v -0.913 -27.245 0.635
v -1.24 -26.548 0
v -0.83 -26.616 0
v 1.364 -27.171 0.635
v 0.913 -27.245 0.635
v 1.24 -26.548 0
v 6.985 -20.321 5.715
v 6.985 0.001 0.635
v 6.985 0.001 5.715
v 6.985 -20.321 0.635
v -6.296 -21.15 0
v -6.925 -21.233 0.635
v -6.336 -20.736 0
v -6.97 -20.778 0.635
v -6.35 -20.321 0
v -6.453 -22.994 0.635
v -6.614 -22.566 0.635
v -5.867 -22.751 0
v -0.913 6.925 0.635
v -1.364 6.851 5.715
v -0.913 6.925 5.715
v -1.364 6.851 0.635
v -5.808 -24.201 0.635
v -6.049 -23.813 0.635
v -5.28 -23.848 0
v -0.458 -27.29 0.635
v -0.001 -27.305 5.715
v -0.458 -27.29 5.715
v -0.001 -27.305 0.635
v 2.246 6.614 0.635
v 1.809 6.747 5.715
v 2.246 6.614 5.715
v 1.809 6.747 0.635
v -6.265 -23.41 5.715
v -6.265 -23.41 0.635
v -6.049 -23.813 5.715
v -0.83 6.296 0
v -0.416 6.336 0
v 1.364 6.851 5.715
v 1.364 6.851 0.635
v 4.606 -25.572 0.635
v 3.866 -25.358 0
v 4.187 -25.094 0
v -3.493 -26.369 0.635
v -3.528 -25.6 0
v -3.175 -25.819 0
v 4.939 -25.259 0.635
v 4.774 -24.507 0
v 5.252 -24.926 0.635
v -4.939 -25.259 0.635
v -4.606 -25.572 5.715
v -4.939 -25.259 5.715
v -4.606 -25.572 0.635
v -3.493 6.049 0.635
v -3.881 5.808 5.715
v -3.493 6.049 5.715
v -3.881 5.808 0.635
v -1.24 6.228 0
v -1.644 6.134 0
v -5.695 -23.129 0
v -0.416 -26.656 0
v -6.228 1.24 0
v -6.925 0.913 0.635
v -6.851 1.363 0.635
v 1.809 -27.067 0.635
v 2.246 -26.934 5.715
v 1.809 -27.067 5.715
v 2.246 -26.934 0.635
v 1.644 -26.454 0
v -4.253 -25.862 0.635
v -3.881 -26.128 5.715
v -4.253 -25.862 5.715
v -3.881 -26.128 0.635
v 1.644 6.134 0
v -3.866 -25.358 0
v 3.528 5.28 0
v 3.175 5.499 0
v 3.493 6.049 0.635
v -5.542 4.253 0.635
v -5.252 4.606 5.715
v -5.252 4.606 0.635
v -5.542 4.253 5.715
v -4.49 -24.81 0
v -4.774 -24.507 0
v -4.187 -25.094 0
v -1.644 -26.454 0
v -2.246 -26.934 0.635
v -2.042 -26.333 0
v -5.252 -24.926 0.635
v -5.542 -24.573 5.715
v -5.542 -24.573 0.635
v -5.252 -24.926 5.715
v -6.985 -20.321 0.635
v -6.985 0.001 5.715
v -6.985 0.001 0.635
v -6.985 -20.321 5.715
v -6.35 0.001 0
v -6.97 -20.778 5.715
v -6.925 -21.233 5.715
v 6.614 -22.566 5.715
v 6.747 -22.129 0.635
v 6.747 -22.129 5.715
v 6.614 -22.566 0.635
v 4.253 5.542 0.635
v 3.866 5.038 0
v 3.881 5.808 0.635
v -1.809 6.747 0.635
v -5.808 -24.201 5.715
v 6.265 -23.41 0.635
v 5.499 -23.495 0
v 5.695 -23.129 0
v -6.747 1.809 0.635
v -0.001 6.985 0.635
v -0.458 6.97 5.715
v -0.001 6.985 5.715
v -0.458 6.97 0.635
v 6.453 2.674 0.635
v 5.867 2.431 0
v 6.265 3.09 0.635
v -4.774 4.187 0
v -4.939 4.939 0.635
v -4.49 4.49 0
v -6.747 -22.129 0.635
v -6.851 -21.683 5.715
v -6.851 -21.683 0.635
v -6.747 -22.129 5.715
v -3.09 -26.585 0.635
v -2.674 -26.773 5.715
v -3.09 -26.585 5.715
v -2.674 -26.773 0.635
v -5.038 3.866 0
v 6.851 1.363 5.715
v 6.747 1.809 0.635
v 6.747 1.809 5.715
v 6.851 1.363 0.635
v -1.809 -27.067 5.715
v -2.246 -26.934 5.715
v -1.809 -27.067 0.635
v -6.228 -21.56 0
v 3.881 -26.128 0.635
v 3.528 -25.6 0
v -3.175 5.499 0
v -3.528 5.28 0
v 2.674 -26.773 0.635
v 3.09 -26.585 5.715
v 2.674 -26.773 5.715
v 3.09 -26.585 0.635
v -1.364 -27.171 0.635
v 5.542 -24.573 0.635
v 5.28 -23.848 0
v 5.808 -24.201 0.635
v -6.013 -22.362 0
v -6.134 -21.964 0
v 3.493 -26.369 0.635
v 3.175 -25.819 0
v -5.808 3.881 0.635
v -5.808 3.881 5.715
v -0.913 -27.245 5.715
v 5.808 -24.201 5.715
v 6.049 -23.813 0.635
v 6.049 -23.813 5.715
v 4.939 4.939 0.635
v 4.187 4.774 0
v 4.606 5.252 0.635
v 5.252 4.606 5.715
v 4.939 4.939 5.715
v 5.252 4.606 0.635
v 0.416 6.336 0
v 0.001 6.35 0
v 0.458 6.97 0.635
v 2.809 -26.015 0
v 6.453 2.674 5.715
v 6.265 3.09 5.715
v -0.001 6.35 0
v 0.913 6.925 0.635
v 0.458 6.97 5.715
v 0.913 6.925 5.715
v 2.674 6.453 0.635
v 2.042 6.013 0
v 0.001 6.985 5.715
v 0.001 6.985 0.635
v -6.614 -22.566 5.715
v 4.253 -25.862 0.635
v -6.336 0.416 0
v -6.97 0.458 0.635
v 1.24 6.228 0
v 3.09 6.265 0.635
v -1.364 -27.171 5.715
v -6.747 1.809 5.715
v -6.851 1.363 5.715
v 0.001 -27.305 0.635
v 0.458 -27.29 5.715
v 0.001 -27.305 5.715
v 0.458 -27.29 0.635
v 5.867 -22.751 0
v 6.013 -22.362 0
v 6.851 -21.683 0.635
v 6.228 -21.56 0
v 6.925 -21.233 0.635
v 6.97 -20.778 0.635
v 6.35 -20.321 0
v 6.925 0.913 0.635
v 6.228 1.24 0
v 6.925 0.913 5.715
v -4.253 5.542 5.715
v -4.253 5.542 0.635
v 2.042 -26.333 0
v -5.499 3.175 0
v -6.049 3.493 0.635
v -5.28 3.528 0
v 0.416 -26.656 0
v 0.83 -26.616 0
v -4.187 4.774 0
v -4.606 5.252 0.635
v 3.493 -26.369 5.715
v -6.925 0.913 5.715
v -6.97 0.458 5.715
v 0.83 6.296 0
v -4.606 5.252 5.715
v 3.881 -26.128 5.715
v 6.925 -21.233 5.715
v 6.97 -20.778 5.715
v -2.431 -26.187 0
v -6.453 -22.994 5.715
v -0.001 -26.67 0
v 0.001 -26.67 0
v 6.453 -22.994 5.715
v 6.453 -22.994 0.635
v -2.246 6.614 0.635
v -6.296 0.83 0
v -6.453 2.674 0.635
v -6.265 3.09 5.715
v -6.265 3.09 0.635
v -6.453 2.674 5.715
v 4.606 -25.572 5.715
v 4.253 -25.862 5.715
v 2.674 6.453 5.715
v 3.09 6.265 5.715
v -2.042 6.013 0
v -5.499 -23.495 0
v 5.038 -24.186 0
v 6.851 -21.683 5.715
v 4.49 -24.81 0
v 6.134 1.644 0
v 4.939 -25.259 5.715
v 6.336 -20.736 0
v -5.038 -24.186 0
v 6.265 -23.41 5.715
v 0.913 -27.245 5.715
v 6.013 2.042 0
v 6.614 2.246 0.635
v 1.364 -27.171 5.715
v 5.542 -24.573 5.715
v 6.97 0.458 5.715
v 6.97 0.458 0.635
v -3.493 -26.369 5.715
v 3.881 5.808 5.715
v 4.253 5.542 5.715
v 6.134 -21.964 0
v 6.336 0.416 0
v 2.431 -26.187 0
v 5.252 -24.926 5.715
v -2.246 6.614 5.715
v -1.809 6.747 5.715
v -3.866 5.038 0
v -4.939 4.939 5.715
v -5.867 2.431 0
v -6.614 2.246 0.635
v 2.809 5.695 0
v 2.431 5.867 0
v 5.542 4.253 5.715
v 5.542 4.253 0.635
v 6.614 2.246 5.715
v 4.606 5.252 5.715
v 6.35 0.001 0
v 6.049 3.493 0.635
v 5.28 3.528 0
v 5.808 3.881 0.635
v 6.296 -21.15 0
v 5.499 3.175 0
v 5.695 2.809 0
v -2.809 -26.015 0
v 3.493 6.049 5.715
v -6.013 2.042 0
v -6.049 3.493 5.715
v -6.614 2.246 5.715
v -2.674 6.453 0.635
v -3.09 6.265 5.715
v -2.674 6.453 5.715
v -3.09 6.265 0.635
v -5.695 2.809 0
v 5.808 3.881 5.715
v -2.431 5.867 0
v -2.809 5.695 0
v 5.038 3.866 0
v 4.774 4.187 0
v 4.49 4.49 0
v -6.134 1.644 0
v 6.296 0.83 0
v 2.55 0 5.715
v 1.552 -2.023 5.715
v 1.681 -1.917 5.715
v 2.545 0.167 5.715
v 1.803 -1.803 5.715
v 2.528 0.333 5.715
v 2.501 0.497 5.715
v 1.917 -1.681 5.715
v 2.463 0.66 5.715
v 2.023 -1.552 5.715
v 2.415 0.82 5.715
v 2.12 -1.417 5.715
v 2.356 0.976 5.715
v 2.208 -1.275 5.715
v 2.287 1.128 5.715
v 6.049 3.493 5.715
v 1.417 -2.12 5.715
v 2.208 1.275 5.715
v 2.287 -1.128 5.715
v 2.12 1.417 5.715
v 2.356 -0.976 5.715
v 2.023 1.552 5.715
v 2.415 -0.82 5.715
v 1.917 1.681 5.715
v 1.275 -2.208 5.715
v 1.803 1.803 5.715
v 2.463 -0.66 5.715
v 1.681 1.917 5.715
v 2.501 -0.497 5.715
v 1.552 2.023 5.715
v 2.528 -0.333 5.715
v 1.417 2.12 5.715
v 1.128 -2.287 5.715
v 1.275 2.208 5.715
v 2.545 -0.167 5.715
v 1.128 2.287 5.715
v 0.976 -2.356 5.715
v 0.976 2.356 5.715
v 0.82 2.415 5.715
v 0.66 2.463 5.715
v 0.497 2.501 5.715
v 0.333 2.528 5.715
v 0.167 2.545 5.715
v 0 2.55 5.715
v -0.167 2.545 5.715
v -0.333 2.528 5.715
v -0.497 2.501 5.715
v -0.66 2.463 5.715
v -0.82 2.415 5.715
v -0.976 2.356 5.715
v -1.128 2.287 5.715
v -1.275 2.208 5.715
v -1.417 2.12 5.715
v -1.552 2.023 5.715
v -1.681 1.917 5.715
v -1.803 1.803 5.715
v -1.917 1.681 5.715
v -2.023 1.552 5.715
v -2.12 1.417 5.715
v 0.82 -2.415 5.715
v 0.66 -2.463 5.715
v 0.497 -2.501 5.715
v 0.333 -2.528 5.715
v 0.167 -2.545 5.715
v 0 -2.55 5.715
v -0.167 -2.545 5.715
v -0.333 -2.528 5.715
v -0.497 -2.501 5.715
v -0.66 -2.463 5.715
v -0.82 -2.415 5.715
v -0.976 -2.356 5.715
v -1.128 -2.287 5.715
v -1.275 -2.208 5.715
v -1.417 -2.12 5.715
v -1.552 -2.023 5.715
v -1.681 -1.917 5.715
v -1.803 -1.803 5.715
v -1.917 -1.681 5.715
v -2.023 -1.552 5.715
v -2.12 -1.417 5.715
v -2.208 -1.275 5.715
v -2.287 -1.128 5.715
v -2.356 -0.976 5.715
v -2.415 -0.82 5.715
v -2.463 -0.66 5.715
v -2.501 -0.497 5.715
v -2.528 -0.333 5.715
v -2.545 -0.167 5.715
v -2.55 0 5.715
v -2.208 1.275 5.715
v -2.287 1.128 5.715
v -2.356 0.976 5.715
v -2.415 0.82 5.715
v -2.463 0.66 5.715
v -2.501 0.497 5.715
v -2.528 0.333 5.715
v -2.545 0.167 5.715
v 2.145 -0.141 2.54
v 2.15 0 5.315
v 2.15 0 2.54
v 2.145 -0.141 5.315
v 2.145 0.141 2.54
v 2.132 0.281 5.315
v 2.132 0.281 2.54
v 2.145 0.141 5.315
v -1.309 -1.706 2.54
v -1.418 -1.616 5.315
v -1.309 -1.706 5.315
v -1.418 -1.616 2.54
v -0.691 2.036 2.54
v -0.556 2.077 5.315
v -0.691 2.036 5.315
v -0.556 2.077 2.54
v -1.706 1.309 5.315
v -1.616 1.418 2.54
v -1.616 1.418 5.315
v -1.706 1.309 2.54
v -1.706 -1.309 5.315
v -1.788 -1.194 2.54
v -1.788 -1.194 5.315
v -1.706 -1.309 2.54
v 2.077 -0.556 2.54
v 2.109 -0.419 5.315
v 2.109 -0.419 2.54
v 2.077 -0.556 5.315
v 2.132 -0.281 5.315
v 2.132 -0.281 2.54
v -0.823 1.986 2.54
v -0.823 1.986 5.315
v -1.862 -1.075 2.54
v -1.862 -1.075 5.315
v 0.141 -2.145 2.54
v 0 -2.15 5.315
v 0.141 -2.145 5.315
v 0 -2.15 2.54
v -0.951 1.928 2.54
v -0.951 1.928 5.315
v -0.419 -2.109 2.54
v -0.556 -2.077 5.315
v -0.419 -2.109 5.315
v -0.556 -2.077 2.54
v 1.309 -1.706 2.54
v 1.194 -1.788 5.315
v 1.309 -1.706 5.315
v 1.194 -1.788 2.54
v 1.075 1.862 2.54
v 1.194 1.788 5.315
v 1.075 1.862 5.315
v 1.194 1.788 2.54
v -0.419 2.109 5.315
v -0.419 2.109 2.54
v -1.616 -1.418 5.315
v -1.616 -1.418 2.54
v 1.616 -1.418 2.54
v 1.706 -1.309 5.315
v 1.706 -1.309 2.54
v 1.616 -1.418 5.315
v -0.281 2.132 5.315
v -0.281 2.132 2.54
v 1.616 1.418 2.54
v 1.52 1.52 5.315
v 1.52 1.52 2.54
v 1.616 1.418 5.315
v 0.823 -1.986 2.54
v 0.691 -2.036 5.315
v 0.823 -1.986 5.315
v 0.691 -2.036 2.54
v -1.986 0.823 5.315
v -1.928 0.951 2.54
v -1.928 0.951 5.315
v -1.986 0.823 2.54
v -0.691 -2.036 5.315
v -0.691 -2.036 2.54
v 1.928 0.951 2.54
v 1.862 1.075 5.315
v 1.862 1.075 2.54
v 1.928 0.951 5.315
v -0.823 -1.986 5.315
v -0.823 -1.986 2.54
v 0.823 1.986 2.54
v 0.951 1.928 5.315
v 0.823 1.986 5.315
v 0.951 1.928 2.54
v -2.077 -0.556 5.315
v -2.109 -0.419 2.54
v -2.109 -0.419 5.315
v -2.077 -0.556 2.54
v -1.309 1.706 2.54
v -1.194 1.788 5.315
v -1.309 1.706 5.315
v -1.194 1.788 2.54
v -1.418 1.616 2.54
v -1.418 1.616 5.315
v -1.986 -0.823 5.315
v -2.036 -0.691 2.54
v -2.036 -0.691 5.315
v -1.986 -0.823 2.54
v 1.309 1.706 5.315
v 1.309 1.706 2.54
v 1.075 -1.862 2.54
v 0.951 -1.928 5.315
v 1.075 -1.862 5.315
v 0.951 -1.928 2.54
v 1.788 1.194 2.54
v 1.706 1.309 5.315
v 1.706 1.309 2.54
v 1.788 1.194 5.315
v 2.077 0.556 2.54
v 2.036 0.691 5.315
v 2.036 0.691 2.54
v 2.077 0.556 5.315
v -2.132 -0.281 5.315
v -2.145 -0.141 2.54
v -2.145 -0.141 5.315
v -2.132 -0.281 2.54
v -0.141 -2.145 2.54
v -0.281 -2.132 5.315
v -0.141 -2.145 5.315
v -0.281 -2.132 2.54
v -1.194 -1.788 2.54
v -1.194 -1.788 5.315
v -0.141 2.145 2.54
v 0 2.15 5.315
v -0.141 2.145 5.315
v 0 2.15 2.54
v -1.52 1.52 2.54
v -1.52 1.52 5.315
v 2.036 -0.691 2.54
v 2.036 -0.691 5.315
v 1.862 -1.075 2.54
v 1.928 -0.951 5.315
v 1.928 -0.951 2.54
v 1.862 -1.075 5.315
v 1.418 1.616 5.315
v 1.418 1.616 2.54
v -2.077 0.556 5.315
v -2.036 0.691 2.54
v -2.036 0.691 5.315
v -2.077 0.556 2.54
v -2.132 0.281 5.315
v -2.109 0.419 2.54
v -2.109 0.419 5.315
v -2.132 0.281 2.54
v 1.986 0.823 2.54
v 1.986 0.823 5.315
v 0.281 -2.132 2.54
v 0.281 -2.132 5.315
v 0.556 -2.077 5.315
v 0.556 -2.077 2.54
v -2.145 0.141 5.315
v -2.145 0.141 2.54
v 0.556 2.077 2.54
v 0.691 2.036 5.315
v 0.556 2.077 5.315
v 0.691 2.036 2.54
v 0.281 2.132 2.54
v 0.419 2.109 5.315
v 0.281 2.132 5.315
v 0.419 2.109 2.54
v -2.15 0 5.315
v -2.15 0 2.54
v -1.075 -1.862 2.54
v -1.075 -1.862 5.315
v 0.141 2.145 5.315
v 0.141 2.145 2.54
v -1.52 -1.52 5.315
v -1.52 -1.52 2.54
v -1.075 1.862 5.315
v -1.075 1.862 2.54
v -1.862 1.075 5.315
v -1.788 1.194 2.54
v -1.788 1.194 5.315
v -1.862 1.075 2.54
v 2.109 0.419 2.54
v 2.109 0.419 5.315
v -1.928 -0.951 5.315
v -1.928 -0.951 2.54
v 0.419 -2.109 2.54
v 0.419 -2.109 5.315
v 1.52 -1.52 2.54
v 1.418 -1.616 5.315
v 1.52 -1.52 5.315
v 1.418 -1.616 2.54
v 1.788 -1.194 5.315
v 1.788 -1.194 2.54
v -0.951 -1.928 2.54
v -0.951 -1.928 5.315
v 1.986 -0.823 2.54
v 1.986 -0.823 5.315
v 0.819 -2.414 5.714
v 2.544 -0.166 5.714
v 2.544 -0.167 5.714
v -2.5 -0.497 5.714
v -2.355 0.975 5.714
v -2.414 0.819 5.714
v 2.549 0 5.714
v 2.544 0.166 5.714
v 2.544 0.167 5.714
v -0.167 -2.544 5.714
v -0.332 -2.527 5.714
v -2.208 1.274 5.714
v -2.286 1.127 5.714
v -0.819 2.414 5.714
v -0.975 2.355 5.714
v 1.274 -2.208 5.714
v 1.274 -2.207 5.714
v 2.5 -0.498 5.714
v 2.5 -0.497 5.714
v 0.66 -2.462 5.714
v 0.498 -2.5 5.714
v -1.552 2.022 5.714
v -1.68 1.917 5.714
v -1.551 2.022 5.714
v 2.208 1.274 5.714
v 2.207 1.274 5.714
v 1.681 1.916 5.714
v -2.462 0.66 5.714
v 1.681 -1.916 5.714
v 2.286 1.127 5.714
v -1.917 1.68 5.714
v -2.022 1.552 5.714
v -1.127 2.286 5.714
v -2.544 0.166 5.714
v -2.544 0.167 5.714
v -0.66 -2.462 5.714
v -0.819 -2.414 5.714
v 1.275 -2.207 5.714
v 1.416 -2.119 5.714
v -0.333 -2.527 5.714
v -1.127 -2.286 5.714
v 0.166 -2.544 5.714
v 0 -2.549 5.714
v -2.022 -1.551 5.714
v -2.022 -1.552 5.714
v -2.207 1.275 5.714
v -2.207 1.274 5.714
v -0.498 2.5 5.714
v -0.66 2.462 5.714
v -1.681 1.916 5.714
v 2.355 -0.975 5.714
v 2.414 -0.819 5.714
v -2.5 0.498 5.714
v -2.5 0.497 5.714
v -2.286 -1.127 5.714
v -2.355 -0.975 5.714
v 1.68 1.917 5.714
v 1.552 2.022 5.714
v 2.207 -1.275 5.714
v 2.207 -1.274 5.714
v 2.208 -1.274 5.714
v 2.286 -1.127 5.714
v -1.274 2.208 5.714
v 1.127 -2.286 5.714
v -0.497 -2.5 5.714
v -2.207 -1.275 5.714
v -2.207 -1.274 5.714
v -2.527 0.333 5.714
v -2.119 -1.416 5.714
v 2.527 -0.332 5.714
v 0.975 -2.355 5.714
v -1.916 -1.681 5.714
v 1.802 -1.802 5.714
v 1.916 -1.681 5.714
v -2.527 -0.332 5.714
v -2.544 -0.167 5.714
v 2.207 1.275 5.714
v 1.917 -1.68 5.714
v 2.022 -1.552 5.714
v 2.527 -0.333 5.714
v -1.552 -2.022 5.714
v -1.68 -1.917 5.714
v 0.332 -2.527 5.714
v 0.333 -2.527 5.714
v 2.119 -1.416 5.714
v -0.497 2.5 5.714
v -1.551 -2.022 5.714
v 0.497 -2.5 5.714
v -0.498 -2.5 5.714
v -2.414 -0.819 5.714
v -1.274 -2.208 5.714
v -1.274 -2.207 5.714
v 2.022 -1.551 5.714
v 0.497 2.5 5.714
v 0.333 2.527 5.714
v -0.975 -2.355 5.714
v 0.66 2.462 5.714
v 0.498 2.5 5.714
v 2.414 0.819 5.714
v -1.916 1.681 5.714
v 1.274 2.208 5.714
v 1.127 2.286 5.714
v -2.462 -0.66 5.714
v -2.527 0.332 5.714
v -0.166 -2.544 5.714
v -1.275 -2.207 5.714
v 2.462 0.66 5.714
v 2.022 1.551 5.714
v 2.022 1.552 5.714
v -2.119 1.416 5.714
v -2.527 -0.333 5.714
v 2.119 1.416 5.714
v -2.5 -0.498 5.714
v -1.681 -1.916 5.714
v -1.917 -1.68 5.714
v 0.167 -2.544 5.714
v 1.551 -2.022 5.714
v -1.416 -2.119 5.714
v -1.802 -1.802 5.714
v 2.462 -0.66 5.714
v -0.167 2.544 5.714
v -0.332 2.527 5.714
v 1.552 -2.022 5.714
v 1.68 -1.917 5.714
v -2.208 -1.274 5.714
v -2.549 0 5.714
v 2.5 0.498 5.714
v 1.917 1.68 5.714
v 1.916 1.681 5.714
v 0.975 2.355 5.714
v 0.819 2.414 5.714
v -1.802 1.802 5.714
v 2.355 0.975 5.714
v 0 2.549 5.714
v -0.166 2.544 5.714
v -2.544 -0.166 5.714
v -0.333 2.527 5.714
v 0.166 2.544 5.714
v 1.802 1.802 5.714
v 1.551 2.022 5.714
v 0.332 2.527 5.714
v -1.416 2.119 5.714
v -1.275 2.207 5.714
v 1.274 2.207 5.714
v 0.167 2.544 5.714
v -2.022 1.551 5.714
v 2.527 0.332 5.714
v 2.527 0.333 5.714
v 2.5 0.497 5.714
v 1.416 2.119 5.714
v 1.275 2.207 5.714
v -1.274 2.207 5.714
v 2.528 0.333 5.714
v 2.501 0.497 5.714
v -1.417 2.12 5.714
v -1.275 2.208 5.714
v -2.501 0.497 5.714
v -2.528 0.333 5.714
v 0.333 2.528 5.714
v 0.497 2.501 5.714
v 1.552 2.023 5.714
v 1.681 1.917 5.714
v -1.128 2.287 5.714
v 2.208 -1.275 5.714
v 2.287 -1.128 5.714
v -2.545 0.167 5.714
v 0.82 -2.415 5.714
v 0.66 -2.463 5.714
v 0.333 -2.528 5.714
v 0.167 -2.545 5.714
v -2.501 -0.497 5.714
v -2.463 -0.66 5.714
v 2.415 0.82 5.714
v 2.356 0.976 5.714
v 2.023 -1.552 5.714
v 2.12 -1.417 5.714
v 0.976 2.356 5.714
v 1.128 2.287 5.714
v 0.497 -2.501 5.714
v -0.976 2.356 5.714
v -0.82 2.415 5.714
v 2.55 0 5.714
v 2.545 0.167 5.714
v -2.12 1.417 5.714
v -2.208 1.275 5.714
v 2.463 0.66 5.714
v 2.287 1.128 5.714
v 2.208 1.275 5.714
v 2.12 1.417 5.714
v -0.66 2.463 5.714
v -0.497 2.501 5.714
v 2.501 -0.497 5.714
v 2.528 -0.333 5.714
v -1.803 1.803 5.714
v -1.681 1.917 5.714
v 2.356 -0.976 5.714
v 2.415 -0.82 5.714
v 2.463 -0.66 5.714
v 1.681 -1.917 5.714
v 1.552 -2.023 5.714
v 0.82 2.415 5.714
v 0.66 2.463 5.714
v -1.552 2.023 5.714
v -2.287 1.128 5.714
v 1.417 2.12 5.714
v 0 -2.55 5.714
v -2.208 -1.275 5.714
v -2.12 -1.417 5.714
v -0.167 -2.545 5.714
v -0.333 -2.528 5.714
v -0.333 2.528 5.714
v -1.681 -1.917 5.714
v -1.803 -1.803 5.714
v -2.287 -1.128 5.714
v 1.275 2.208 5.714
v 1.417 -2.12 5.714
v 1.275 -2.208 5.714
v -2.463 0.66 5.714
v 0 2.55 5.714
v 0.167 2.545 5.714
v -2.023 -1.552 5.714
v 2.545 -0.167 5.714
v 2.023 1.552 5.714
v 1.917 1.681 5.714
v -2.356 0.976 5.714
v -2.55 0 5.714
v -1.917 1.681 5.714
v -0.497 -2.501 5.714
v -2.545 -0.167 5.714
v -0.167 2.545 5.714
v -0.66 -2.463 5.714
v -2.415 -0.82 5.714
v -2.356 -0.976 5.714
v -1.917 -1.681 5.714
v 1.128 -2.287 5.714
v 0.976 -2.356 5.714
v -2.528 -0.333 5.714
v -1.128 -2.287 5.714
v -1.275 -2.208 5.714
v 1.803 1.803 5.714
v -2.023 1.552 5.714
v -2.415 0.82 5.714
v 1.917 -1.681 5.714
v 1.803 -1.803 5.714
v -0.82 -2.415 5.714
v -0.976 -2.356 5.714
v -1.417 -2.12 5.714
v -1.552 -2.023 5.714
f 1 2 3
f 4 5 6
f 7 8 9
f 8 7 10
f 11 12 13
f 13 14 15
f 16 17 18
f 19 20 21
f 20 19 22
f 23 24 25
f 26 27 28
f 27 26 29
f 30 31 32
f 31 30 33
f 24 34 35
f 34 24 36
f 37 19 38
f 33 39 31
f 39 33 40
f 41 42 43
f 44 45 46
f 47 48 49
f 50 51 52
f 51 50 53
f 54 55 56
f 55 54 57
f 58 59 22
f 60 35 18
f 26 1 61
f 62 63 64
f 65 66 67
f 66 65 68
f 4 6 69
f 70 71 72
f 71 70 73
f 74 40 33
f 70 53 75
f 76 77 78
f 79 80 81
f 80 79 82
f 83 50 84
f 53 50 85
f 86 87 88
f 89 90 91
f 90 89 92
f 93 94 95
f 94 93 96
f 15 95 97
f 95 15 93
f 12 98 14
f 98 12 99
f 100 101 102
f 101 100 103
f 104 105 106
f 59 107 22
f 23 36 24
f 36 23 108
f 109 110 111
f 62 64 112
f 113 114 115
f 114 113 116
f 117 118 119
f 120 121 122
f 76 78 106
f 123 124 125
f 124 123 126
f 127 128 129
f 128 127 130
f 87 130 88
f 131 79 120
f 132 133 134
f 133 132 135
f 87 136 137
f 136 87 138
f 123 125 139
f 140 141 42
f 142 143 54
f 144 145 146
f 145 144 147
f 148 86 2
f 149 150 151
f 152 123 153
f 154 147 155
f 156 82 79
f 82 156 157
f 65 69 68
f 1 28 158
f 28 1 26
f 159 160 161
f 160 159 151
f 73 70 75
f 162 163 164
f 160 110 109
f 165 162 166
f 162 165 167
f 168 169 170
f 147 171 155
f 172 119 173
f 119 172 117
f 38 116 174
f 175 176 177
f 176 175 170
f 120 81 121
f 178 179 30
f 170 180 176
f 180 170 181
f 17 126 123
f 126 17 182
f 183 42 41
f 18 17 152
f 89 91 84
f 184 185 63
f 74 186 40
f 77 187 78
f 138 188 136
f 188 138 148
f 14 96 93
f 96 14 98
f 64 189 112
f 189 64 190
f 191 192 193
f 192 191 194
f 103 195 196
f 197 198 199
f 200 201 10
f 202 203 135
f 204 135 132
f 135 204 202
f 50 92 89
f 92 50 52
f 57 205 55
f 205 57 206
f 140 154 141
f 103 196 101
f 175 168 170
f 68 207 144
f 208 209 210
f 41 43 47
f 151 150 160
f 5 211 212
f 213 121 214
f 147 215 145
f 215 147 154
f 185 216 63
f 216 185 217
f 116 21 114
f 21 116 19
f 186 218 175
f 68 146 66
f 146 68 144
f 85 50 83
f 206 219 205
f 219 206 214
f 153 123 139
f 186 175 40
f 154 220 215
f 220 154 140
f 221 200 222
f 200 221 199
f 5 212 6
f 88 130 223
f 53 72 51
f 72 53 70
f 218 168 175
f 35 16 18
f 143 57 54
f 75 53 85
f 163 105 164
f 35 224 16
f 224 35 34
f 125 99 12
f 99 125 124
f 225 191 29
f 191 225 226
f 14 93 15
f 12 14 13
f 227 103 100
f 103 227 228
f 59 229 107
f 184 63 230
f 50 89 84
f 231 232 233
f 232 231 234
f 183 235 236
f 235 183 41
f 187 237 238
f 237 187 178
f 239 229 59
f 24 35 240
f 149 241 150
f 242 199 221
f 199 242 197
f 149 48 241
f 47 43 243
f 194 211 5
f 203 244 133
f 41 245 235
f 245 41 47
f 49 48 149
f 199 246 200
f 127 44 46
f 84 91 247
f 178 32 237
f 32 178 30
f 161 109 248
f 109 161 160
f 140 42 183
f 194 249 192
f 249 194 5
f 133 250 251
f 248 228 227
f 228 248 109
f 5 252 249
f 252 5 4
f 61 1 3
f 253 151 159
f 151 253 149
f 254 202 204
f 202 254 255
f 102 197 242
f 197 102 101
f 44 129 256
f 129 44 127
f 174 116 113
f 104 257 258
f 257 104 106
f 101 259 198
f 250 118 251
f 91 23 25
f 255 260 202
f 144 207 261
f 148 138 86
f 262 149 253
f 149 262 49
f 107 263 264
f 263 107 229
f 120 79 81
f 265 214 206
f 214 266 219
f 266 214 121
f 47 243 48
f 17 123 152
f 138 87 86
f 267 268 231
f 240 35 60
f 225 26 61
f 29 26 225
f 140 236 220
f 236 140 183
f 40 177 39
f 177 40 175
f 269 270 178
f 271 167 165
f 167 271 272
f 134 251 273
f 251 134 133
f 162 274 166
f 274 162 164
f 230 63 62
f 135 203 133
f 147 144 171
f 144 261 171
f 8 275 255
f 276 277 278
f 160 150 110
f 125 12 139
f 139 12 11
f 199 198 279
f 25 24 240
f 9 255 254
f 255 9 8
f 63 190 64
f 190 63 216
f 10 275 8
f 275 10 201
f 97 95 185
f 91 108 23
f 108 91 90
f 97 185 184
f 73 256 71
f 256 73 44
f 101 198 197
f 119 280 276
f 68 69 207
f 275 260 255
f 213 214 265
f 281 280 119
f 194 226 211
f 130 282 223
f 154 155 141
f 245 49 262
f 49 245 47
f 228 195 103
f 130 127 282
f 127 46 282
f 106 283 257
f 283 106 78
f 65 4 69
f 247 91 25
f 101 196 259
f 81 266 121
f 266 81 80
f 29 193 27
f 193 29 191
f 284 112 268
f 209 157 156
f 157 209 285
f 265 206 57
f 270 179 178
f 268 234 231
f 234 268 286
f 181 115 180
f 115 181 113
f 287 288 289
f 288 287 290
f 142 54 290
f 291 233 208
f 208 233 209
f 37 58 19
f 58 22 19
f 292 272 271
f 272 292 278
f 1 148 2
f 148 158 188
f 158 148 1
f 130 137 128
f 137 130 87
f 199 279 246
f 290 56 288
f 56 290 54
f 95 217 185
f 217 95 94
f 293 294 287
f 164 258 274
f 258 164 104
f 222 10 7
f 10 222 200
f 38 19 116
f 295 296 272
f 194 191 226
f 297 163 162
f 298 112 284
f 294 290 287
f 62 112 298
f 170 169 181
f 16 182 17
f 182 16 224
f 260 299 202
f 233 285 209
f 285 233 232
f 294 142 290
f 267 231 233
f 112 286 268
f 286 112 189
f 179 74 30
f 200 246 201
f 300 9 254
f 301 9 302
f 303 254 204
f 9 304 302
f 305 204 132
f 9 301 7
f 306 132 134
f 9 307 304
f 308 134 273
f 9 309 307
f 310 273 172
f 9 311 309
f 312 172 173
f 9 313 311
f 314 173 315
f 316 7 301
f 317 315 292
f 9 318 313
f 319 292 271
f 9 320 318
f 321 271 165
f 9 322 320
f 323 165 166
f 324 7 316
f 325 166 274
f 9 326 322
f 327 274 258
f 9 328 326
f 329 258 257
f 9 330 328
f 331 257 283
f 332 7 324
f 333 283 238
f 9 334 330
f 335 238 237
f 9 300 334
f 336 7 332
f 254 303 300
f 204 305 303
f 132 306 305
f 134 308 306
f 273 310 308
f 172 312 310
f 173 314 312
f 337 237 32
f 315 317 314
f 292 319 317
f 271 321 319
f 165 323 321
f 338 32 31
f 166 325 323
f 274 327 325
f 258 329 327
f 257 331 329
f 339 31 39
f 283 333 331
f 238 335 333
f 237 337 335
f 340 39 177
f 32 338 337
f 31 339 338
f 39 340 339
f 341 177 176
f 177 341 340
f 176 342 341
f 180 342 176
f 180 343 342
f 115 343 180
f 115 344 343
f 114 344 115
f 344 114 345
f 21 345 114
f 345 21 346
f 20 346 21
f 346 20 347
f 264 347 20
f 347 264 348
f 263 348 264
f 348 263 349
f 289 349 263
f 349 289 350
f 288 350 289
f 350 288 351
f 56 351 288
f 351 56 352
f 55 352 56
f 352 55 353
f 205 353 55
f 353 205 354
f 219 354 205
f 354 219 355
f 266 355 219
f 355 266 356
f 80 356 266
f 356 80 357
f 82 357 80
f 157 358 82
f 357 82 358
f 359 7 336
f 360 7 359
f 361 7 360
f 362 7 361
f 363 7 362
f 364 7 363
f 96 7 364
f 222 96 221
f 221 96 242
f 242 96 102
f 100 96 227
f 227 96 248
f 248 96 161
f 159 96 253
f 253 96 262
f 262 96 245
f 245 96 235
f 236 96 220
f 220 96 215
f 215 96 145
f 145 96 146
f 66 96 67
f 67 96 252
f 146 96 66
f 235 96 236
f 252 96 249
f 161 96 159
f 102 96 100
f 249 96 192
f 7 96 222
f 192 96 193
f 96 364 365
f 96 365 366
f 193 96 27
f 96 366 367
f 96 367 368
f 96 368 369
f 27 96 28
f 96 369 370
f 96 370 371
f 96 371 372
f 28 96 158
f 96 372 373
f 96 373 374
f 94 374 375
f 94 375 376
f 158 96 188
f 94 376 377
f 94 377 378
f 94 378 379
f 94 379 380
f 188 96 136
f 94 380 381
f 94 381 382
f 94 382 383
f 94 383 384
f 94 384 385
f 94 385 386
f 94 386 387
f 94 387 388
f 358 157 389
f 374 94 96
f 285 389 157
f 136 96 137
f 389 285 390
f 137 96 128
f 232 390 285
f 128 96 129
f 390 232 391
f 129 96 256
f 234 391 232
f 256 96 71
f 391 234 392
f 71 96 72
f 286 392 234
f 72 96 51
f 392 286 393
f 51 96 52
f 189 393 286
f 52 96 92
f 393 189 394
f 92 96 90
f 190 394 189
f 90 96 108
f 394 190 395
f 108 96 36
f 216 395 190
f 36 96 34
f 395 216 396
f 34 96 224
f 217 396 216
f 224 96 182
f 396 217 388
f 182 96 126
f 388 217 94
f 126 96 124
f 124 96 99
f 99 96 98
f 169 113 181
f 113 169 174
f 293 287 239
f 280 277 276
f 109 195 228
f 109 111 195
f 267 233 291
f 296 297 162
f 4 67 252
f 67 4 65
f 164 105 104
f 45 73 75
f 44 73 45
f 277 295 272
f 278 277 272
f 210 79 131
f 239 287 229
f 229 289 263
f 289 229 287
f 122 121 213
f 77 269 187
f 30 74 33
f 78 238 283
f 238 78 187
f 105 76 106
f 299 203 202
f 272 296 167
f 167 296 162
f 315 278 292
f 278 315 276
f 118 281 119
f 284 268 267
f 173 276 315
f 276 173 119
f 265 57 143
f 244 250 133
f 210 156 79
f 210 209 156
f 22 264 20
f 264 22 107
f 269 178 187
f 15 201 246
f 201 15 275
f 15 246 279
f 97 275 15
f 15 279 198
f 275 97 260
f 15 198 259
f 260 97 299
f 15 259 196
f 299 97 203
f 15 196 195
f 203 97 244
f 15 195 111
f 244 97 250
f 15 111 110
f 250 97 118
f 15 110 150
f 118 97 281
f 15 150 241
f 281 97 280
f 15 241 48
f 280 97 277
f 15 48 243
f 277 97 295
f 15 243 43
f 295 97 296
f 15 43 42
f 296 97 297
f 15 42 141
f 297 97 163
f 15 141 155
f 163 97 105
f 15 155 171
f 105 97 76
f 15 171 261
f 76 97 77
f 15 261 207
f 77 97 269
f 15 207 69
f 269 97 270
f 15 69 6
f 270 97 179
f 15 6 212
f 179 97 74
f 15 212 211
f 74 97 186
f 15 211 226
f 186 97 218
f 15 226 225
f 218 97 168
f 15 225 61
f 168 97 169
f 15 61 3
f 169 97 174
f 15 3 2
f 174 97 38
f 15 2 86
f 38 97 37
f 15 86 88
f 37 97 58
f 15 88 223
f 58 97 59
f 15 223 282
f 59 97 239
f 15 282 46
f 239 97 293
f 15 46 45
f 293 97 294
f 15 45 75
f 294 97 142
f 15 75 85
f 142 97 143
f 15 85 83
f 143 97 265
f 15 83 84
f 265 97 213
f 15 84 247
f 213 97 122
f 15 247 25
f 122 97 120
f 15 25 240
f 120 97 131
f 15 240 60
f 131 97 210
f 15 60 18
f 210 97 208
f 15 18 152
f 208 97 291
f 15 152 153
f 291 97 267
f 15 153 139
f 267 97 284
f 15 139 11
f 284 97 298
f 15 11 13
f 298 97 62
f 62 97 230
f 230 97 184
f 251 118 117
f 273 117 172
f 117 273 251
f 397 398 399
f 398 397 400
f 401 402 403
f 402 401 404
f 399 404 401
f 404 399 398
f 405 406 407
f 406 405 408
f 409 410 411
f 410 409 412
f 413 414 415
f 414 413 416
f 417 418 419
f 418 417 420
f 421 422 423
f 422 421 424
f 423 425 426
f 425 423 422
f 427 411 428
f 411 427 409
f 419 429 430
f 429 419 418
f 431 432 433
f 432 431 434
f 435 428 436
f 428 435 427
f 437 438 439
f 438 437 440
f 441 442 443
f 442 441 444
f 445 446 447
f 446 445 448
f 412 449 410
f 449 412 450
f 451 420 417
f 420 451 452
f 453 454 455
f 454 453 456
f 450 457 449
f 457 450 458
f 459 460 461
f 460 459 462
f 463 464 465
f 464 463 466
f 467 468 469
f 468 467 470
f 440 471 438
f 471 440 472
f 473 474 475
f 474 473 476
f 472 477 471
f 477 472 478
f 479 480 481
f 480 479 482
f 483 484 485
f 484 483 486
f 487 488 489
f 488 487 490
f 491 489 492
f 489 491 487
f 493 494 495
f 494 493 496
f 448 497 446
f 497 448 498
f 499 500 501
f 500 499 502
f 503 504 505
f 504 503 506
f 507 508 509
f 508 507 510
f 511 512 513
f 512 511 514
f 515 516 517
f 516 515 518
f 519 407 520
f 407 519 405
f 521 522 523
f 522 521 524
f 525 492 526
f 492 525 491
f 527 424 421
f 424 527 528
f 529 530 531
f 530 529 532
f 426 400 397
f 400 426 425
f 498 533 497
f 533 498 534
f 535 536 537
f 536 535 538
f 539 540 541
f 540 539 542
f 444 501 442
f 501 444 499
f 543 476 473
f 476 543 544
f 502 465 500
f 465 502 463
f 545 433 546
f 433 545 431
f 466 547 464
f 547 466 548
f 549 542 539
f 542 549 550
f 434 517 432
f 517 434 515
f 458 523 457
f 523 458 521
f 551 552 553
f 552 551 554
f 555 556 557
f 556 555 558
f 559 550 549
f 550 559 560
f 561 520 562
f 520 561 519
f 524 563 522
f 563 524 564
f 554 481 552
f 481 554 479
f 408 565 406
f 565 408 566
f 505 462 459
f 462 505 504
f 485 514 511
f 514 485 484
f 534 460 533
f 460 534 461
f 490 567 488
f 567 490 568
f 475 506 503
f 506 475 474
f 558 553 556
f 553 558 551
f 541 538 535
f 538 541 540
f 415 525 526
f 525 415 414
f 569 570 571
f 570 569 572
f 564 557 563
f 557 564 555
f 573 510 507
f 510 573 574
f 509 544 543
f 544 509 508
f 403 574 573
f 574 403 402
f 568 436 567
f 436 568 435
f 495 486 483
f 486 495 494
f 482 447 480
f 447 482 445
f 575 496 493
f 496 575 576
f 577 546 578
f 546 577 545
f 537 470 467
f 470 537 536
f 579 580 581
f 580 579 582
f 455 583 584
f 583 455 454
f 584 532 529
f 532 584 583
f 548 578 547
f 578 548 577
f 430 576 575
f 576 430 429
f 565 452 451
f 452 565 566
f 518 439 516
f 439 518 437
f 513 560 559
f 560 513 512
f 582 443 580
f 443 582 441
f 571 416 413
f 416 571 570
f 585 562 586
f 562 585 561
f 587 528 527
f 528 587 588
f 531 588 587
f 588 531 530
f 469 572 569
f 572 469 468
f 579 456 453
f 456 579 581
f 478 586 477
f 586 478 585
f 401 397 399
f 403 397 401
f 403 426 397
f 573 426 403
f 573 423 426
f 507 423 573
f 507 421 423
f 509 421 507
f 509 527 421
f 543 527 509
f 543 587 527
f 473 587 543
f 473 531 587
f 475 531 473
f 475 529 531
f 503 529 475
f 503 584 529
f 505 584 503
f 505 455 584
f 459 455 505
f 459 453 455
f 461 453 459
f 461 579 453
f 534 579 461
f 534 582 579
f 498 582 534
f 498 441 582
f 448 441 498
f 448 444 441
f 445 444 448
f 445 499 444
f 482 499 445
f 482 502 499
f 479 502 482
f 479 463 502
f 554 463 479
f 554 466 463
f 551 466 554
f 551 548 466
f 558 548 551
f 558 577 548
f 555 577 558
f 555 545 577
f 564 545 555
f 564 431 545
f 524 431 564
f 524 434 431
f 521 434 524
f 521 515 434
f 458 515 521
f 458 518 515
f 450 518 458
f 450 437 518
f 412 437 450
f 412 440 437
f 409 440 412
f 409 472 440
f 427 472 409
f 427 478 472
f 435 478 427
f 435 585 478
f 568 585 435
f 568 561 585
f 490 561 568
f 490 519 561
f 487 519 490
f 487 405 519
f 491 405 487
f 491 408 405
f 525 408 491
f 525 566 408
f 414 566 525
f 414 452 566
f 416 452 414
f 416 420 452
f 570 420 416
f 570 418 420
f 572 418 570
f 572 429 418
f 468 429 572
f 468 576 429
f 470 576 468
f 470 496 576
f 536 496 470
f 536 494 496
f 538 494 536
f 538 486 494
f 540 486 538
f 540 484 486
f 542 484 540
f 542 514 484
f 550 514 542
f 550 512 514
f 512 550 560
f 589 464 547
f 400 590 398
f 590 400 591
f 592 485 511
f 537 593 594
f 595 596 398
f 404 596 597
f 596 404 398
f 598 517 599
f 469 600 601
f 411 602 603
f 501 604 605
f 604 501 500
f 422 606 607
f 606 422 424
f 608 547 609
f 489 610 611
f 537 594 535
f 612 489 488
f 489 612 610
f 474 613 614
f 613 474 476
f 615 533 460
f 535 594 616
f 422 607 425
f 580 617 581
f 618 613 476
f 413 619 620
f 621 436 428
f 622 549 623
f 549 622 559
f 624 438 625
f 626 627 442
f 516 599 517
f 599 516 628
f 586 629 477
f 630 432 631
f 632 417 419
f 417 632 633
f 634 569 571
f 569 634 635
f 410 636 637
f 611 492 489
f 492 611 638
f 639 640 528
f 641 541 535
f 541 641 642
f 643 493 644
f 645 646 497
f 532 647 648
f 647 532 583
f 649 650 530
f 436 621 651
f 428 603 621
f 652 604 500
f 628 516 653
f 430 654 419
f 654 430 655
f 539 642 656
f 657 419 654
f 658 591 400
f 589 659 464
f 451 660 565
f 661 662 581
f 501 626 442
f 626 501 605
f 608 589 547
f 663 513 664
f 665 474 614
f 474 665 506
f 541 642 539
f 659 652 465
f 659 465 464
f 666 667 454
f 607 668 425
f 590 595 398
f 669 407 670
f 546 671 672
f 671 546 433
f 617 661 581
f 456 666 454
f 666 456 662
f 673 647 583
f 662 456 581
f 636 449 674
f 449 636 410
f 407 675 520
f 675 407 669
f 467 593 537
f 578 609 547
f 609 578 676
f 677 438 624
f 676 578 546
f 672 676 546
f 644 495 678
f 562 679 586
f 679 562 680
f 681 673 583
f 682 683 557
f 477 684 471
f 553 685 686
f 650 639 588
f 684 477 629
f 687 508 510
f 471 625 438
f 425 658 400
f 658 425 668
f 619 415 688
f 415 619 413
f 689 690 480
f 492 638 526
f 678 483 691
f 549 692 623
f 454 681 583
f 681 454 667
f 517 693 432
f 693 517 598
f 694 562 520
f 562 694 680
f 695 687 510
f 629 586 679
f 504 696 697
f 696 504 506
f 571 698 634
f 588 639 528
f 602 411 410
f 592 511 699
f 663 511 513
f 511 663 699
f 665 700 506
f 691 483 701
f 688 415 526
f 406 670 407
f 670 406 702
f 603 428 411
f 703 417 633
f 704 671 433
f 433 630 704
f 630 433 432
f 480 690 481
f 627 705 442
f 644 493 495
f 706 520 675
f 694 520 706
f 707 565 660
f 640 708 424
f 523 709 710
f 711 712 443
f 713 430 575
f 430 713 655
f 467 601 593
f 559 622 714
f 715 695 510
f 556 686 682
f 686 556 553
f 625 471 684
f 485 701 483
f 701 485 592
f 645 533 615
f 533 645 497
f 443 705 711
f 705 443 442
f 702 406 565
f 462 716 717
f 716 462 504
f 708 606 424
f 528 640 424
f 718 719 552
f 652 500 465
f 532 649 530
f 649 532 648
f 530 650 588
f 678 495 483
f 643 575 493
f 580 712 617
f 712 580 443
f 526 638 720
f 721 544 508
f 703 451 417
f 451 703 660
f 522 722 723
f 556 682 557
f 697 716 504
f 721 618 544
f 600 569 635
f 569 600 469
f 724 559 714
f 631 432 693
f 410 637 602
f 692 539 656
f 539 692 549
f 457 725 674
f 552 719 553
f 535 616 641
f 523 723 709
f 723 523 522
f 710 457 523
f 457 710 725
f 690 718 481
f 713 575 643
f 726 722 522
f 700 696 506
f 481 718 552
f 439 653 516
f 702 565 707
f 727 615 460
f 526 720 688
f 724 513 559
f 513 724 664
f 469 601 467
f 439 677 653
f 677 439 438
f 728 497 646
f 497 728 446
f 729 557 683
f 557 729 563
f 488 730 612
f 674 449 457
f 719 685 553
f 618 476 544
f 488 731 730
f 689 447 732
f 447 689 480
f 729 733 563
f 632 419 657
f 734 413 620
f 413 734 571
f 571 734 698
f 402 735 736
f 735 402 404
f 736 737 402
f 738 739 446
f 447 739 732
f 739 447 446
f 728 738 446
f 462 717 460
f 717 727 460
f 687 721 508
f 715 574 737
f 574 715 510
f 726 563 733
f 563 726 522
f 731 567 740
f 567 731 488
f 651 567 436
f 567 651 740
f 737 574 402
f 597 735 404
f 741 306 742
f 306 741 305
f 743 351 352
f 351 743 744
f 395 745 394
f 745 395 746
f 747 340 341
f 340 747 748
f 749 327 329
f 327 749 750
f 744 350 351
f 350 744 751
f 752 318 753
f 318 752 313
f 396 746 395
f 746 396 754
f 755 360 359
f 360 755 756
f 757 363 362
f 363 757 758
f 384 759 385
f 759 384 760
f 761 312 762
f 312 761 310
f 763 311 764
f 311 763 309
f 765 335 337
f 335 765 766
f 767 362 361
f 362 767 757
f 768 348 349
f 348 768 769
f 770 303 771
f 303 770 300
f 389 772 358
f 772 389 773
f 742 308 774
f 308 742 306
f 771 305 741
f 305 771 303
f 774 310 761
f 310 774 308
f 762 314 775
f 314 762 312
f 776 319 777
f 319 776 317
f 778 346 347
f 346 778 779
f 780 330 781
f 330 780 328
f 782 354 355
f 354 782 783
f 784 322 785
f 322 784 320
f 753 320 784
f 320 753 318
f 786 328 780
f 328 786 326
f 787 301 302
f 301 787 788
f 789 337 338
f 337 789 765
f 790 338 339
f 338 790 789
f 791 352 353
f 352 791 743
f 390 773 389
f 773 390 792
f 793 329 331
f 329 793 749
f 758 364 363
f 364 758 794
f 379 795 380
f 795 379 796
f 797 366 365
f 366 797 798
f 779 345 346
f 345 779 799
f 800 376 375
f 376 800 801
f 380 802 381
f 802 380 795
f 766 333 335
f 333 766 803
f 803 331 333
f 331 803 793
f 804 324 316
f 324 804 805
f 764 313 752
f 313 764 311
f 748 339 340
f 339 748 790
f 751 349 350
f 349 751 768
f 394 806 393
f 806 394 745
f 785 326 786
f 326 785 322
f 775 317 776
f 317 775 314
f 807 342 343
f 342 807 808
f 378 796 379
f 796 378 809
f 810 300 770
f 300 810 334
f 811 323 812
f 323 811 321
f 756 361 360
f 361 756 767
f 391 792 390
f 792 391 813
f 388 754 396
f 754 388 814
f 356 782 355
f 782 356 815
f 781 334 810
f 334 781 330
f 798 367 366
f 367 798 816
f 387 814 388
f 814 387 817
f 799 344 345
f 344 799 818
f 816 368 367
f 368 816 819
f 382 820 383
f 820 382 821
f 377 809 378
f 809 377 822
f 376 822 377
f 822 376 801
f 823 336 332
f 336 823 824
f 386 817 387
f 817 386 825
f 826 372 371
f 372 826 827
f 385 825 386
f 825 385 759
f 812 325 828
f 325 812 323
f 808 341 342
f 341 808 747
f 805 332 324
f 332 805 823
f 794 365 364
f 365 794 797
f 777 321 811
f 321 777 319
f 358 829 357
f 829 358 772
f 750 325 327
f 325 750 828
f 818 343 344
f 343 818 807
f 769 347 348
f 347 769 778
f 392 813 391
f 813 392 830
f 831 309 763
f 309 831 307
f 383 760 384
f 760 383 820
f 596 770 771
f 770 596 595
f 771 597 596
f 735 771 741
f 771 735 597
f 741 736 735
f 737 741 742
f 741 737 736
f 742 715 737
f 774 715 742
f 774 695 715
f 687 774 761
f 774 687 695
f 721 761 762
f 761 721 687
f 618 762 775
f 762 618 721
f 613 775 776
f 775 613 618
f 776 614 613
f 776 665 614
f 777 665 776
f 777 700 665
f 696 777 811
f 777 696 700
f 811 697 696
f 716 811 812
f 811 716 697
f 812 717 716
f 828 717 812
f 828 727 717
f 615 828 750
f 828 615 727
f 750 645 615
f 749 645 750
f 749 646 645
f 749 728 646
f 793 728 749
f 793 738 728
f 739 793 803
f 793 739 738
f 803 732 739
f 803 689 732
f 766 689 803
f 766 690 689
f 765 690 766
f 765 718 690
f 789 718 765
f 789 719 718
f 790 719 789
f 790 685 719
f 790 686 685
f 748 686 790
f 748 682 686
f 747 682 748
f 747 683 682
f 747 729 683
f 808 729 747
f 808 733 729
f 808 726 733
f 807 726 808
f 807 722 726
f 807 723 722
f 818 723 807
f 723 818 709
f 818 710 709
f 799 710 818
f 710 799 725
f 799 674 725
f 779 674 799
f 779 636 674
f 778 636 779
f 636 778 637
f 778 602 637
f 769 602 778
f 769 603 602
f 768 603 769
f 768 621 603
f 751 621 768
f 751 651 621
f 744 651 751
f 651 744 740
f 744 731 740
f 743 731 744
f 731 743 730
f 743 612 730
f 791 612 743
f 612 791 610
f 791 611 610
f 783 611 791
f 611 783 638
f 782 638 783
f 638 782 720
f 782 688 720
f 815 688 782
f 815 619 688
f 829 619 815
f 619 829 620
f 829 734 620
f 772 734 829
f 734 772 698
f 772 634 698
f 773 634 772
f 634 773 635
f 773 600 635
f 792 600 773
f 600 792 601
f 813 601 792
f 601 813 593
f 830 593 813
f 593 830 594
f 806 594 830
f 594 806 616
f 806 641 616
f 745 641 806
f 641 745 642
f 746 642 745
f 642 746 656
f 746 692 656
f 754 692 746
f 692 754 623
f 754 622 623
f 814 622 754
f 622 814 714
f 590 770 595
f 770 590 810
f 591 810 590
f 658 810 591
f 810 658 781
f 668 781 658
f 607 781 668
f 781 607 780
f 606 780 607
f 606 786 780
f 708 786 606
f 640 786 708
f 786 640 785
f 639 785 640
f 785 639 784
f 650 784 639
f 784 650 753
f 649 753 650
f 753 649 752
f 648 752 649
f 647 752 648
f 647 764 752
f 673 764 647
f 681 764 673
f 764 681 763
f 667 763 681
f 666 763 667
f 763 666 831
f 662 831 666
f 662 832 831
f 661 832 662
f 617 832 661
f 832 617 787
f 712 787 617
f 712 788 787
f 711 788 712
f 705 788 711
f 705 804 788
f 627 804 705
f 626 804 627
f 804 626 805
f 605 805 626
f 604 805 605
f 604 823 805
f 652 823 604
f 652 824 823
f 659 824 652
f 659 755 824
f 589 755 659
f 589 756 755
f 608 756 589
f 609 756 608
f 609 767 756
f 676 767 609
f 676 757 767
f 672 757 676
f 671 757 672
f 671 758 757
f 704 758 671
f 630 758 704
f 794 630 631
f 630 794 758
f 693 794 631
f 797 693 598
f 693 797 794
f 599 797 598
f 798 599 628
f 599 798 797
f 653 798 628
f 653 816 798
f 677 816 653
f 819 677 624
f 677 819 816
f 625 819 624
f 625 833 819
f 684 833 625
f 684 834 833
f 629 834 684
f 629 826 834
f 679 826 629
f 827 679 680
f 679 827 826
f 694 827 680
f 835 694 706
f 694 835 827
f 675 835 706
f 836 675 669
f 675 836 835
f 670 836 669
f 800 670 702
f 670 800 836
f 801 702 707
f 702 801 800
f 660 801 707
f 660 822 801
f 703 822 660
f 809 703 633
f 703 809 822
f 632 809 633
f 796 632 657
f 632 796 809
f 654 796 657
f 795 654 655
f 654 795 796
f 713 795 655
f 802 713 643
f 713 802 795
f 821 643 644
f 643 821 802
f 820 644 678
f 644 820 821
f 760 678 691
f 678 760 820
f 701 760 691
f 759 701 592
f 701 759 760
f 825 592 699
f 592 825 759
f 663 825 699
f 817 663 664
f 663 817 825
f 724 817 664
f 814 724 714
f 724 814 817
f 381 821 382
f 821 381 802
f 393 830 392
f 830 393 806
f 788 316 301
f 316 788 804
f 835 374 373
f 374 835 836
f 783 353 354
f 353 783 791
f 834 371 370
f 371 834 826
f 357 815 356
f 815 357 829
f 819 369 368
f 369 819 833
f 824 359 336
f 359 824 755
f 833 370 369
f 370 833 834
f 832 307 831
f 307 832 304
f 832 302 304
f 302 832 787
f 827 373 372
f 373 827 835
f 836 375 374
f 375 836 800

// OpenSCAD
// ===========================================================================
//  cYbErDeCk v2 - foot.scad
//  The four feet the whole instrument stands on.
//
//      openscad -D 'part="3d"' -o export/stl/foot.stl v2/cad/foot.scad
//
//  IT EXISTS BECAUSE OF ONE DATUM AND ONE COMPONENT. parameters.scad 3:
//
//      foot_h_min = cowl_h() + 1.270 = 5.090
//
//  The display's 18650 holder reaches 1.820 BELOW the deck's own underside and
//  cannot be contained, so cowl.scad covers it and the cowl hangs 3.820 below
//  the back panel. A foot shorter than 5.090 and the deck does not stand on
//  its feet at all -- it stands on its own battery cowl, off centre, on three
//  points and a rock.
//
//  WHERE THEY GO, AND IT IS NOT FOUR EQUAL CORNERS
//  -----------------------------------------------
//  The back panel is 3.175 mm laser-cut acrylic. A laser cannot counterbore,
//  so the panel has no seat for anything, and a foot bonded to it is a foot
//  that peels off the one part that is also the service access. Every foot
//  therefore lands on a fastener that already exists -- a screw passing up
//  through the panel into an M2.5 heat-set insert in the carrier's floor --
//  and the ten holes in parameters.scad's back_screw_pts() are the whole menu.
//  Four of them, picked for the tipping problem below:
//
//      [ 144.780,  80.7125]   slab_screw_pts()[0]   the rear pair, on the
//      [-144.780,  80.7125]   slab_screw_pts()[3]     slab's own screw line
//      [ -82.550, -63.500]    back_screw_kbd[2]     the front pair, the
//      [  82.550, -63.500]    back_screw_kbd[3]       furthest forward there is
//
//  IT PRESSES ON OVER THE SCREW HEAD AND IT IS NOT IN THE CLAMP PATH, and the
//  first draft of this part got that wrong. Drawn the obvious way -- a
//  counterbore in the foot, the head inside it, the foot clamped between the
//  head and the panel -- the whole preload of four of the panel's ten screws
//  runs through TPU:
//
//      O4.500 head on a O5.500/O2.900 counterbore floor   17.15 mm2
//      a hand-tight M2.5, about 354 N                     20.6 MPa
//
//  TPU 95A creeps at 20 MPa. So those four screws would lose their preload
//  over weeks, the back panel's clamp -- whose whole job is fighting the
//  carrier's bow -- would relax at four of ten points, and nothing would ever
//  show it. A TPU part does not belong in a clamp path.
//
//  So the head bears on the PANEL, exactly as it does at the other six holes,
//  and the foot wraps it: a BLIND pocket in the foot's top face, O4.300 on a
//  O4.500 x 2.500 head, which is 0.200 of diametral interference and is the
//  retention, with 0.675 of air above the head so it can NEVER bottom in the
//  pocket -- if it bottomed, the clamp would be back in the TPU. The standing
//  load goes desk -> sole -> top face -> panel -> carrier, all of it in
//  compression and none of it through the screw: 2.921 N per foot over
//  384.661 mm2 of sole [MEASURED off export/stl/foot.stl] is 0.0076 MPa,
//  1/2700 of the stress that killed the first draft.
//    Two consequences worth having. The foot's height no longer depends on
//  how hard anybody tightened anything -- it is the printed height, full
//  stop. And the screws stay M2.5 x 8 at all ten holes, because the foot adds
//  nothing to the stack.
//    Nine of the ten holes are SLOTS (parameters.scad 6: one round datum, N
//  slots, because PMMA and a printed carrier disagree about length by
//  +/-1.5 mm over the screw span) and the foot does not care -- the slot's
//  float is taken up between the panel and the screw, and the foot is located
//  by the head.
//
//  TIPPING IS A LAYOUT PROBLEM AND IT WAS MEASURED, NOT ASSUMED
//  -----------------------------------------------------------
//  This is a desk instrument with a keyboard at the near edge: the heels of
//  the hands land on y = -95.1875, forward of ANY available fastener. Take the
//  enclosure's own mass and centroid off the exported meshes -- slab 416.55 g,
//  back panel 210.53 g, carrier 564.21 g at 1.19 / 1.19 / 1.27 g/cm3, total
//  1191.29 g with its centroid at y +7.6517 [MEASURED 2026-11-07 from
//  export/stl/*.stl] -- and moments about the front contact line give the
//  downward force at the front edge that lifts the rear feet:
//
//      front contact            tips at
//      y = -63.500  (a round pad on the screw)        26.23 N  =  2.675 kgf
//      y = -90.805  (this part's toe)                262.46 N  = 26.763 kgf
//
//  2.675 kgf is a palm resting on the front edge. So a foot that is just a
//  puck on the bolt makes the deck teeter every time somebody leans on it,
//  and the fix is not a bigger foot but a LONGER one: the pad is a stadium
//  34.290 long with the screw 6.985 from its heel, so its toe reaches
//  y = -90.805, which is 4.3825 inside the panel's front edge and 2.4775
//  behind the carrier's own front face -- so the toe bears on panel that is
//  backed by the carrier's 2.495 front rim, not on the 1.905 of unsupported
//  lip outboard of it.
//    The figure is a LOWER BOUND and deliberately: the keyboard, the display,
//  the Feather, the six controls and every screw are left out of it, and all
//  of them sit behind y = -63.500, so each one only raises the threshold.
//    One part, four off, all four fitted in the SAME orientation, toe toward
//  -Y. At the rear positions the toe then points inboard, which is free: the
//  rear feet are 14.475 from the rear edge and nothing tips backwards. The
//  part is drawn in the orientation it is fitted in, with the screw axis on
//  the origin, so placing it is a translate and never a rotate -- a rotate is
//  a thing that gets forgotten.
//
//  ROCKING IS NOT A LAYOUT PROBLEM AND NO ARRANGEMENT FIXES IT
//  ----------------------------------------------------------
//  Three points define a plane. A rigid body on FOUR contacts bears on all
//  four only if the four soles are coplanar to within the structure's own
//  flexure, and that is kinematics -- moving the feet does not change it.
//  Stating it plainly, with the numbers, because the alternative is a comment
//  that claims the feet "self-level" and does not:
//
//    * TPU 95A's tensile modulus is 56 +/- 3 MPa along the build Z, measured
//      on 3D-PRINTED samples to ASTM D3039 [VENDOR UltiMaker TPU 95A TDS
//      V2.01 09/2025]. Z is the right column: the part prints top-face-down,
//      so the load axis IS the build axis. (The 26 MPa in circulation is the
//      pre-2022 sheet and is retired.)
//    * As a solid pad that is E*A/h = 56 * 384.661 / 5.715 = 3769 N/mm. The
//      deck's own weight is 2.921 N per foot, so self-weight settles the pad
//      0.0008 mm. IT DOES NOT SELF-LEVEL, and because the foot is press-on
//      there is no preload to level it with either -- which is the honest
//      version of a story the first draft told the other way round.
//
//  So the residual rock is exactly the worst non-coplanarity of the four
//  soles as BUILT: four printed pad heights, plus the back panel's flatness
//  over the 165.100 x 144.213 mm rectangle the feet stand on. Neither is
//  sourced in this repository and neither is guessed at here. The procedure
//  that closes it: print the four feet in one job, micrometer the four
//  heights, and shim the short ones with PET film under the top face -- the
//  top face is flat and square to the sole for exactly that reason. If the
//  measured spread turns out worse than a shim should carry, the sole is flat
//  and unobstructed and a bought self-adhesive elastomer bumper with a
//  published load-deflection curve drops onto it without redrawing anything.
//
//  WHAT IT IS MADE OF, AND WHY IT IS THE ONLY PART THAT IS NOT PETG OR PMMA
//  -----------------------------------------------------------------------
//  TPU 95A, 96 Shore A / 48 Shore D [VENDOR, same TDS, ISO 7619-1]. The cost
//  is real and is stated: a second filament and a second print job for 4
//  parts weighing a few grams. What buys it is friction. The deck is TYPED
//  ON -- lateral impulses, 61 keys, both hands -- and a rigid PETG pad on a
//  desk slides, so the instrument would walk away from the user while it was
//  being played. The coefficient of friction of printed TPU on a desk surface
//  is NOT SOURCED; closing it is a spring gauge and a drag test on the real
//  pads, which is also the only way to learn it for a specific desk.
//
//  PRINT IT SOLE DOWN, which is the orientation the pocket decides. The
//  pocket is blind in the top face, so sole-down it opens UPWARD and there is
//  no bridge anywhere; the only overhang in the part is the sole's 0.635
//  chamfer, at 45 degrees. Top-face-down it would ask for a O4.300 bridge
//  across the pocket in a material that bridges badly. Sole-down also puts
//  the sole on the bed, which is the flattest surface a printer makes, and
//  the sole is the one face whose flatness this part is for.
//
//  AND THE COST IN HEIGHT, recorded because somebody will want it: the deck's
//  front edge stands deck_t + 5.715 = 37.465 mm above the desk.
// ===========================================================================

include <parameters.scad>
use <lib/util.scad>

part = "3d";

//  EVERY LOCAL IS PREFIXED ft_. parameters.scad 3 declares foot_h_min and
//  nothing else about the foot; writing `foot_h` here as a bare name would be
//  one keystroke from redefining a datum for the whole scope, which is the
//  mistake that silently redefined the deck's depth in knob.scad.
ft_h       = 5.715;         // [DERIVED] 9 x grid, and it is FORCED rather
                            //   than chosen: foot_h_min is 5.090 and 8 x grid
                            //   is 5.080, which misses it by 0.010. 9 x grid
                            //   is the smallest grid multiple that clears the
                            //   cowl, and the 0.625 it clears by is on top of
                            //   the 1.270 of air foot_h_min already carries.
ft_w       = 13.970;        // [DERIVED] 22 x grid, and it is bracketed from
                            //   above: the rear feet sit on screw_x = 144.780
                            //   and the panel's edge is at body_w/2 = 152.300,
                            //   so a half-width over 7.520 hangs off the deck.
                            //   6.985 leaves 0.535.
ft_toe     = 27.305;        // [DERIVED] 43 x grid, screw to toe. Solved from
                            //   the tipping figures in the header: it is what
                            //   puts the front contact at y = -90.805.
ft_heel    = 6.985;         // [DERIVED] 11 x grid = ft_w/2, so the heel is a
                            //   semicircle centred on the screw. At the rear
                            //   positions that leaves 7.490 to the panel's
                            //   rear edge; any more and the rear feet hang
                            //   over it.
ft_l       = ft_toe + ft_heel;      // [DERIVED] 34.290 = 54 x grid
ft_cham    = 0.635;         // [DESIGN] 1 x grid, 45 deg at the sole. A square
                            //   TPU edge catches and peels when the deck is
                            //   dragged across a desk, which is the one thing
                            //   that is certain to happen to it.

//  THE HEAD. These two belong in parameters.scad 6 beside the clearance
//  diameters and they are NOT there -- back_t's own comment already leans on
//  the 2.500 in prose ("a cap head is 2.500 tall") without declaring it. They
//  are ft_-prefixed locals here rather than bare names for the usual reason,
//  and the value is reported upward rather than added to a file this one does
//  not own.
ft_head_d  = 4.500;         // [STANDARD] ISO 4762 M2.5, dk
ft_head_h  = 2.500;         // [STANDARD] ISO 4762 M2.5, k. The same 2.500
                            //   parameters.scad 3 already quotes.
ft_pocket_d = ft_head_d - 0.200;    // [DESIGN] 4.300. 0.200 of diametral
                            //   interference = 4.4 % strain on the pocket's
                            //   wall, which TPU takes and returns. This is
                            //   the whole retention: push it on, pull it off.
ft_pocket_h = ft_head_h + 0.675;    // [DERIVED] 3.175 = 5 x grid, and the
                            //   0.675 is the number that matters: the head
                            //   must never reach the pocket's floor, because
                            //   the moment it does, the clamp load is back in
                            //   the TPU and the creep argument above applies.
                            //   It is also exactly the relief the back panel
                            //   leaves over the display's own screw heads.
ft_lead    = 0.400;         // [DESIGN] a 45 deg lead-in at the pocket's
                            //   mouth. Pressing a 0.200-interference TPU
                            //   pocket onto a hex-socket head by hand with no
                            //   lead-in is how the mouth tears.

//  THE SOLID FLOOR UNDER THE POCKET: ft_h - ft_pocket_h = 2.540, and it is
//  what makes the sole an unbroken surface. There is no screw hole through
//  this part at all, which is why the sole is 384.741 mm2 rather than 361 and
//  why a bought bumper can be stuck to it later.
//  [MEASURED] 384.6606 mm2 over 98 faces, off the exported mesh.

//  The plan: a stadium, inset by i. A stadium and not a rounded rectangle
//  because a one-screw pad has no corner worth having -- and rrect() clamps
//  r to w/2 - 0.001, so asking for exactly w/2 gives the stadium and not a
//  degenerate hull.
module ft_plan(i) {
    translate([0, (ft_heel - ft_toe)/2])
        rrect(ft_w - 2*i, ft_l - 2*i, ft_w/2 - i);
}

module foot_3d() {
    difference() {
        //  Sole on z = 0, top face on z = ft_h, screw axis on the origin.
        //  The plan is CONVEX, so hull() of the chamfer slice and the body is
        //  exact rather than an approximation of a chamfer.
        hull() {
            linear_extrude(eps) ft_plan(ft_cham);
            translate([0, 0, ft_cham])
                linear_extrude(ft_h - ft_cham) ft_plan(0);
        }
        //  The head's pocket, blind, down from the TOP face. Both cuts
        //  overshoot the top face by 1.000 rather than stopping on it: a cut
        //  that ends exactly on a face leaves coplanar faces, which is the
        //  other half of the family of CGAL failures this repo has paid for.
        //  The thinnest wall is (ft_w - ft_pocket_d)/2 - ft_lead = 4.435.
        translate([0, 0, ft_h - ft_pocket_h])
            cylinder(d = ft_pocket_d, h = ft_pocket_h + 1);
        translate([0, 0, ft_h - ft_lead])
            cylinder(d1 = ft_pocket_d, d2 = ft_pocket_d + 2*ft_lead,
                     h = ft_lead);
        translate([0, 0, ft_h - 0.001])
            cylinder(d = ft_pocket_d + 2*ft_lead, h = 1);
    }
}

foot_3d();
